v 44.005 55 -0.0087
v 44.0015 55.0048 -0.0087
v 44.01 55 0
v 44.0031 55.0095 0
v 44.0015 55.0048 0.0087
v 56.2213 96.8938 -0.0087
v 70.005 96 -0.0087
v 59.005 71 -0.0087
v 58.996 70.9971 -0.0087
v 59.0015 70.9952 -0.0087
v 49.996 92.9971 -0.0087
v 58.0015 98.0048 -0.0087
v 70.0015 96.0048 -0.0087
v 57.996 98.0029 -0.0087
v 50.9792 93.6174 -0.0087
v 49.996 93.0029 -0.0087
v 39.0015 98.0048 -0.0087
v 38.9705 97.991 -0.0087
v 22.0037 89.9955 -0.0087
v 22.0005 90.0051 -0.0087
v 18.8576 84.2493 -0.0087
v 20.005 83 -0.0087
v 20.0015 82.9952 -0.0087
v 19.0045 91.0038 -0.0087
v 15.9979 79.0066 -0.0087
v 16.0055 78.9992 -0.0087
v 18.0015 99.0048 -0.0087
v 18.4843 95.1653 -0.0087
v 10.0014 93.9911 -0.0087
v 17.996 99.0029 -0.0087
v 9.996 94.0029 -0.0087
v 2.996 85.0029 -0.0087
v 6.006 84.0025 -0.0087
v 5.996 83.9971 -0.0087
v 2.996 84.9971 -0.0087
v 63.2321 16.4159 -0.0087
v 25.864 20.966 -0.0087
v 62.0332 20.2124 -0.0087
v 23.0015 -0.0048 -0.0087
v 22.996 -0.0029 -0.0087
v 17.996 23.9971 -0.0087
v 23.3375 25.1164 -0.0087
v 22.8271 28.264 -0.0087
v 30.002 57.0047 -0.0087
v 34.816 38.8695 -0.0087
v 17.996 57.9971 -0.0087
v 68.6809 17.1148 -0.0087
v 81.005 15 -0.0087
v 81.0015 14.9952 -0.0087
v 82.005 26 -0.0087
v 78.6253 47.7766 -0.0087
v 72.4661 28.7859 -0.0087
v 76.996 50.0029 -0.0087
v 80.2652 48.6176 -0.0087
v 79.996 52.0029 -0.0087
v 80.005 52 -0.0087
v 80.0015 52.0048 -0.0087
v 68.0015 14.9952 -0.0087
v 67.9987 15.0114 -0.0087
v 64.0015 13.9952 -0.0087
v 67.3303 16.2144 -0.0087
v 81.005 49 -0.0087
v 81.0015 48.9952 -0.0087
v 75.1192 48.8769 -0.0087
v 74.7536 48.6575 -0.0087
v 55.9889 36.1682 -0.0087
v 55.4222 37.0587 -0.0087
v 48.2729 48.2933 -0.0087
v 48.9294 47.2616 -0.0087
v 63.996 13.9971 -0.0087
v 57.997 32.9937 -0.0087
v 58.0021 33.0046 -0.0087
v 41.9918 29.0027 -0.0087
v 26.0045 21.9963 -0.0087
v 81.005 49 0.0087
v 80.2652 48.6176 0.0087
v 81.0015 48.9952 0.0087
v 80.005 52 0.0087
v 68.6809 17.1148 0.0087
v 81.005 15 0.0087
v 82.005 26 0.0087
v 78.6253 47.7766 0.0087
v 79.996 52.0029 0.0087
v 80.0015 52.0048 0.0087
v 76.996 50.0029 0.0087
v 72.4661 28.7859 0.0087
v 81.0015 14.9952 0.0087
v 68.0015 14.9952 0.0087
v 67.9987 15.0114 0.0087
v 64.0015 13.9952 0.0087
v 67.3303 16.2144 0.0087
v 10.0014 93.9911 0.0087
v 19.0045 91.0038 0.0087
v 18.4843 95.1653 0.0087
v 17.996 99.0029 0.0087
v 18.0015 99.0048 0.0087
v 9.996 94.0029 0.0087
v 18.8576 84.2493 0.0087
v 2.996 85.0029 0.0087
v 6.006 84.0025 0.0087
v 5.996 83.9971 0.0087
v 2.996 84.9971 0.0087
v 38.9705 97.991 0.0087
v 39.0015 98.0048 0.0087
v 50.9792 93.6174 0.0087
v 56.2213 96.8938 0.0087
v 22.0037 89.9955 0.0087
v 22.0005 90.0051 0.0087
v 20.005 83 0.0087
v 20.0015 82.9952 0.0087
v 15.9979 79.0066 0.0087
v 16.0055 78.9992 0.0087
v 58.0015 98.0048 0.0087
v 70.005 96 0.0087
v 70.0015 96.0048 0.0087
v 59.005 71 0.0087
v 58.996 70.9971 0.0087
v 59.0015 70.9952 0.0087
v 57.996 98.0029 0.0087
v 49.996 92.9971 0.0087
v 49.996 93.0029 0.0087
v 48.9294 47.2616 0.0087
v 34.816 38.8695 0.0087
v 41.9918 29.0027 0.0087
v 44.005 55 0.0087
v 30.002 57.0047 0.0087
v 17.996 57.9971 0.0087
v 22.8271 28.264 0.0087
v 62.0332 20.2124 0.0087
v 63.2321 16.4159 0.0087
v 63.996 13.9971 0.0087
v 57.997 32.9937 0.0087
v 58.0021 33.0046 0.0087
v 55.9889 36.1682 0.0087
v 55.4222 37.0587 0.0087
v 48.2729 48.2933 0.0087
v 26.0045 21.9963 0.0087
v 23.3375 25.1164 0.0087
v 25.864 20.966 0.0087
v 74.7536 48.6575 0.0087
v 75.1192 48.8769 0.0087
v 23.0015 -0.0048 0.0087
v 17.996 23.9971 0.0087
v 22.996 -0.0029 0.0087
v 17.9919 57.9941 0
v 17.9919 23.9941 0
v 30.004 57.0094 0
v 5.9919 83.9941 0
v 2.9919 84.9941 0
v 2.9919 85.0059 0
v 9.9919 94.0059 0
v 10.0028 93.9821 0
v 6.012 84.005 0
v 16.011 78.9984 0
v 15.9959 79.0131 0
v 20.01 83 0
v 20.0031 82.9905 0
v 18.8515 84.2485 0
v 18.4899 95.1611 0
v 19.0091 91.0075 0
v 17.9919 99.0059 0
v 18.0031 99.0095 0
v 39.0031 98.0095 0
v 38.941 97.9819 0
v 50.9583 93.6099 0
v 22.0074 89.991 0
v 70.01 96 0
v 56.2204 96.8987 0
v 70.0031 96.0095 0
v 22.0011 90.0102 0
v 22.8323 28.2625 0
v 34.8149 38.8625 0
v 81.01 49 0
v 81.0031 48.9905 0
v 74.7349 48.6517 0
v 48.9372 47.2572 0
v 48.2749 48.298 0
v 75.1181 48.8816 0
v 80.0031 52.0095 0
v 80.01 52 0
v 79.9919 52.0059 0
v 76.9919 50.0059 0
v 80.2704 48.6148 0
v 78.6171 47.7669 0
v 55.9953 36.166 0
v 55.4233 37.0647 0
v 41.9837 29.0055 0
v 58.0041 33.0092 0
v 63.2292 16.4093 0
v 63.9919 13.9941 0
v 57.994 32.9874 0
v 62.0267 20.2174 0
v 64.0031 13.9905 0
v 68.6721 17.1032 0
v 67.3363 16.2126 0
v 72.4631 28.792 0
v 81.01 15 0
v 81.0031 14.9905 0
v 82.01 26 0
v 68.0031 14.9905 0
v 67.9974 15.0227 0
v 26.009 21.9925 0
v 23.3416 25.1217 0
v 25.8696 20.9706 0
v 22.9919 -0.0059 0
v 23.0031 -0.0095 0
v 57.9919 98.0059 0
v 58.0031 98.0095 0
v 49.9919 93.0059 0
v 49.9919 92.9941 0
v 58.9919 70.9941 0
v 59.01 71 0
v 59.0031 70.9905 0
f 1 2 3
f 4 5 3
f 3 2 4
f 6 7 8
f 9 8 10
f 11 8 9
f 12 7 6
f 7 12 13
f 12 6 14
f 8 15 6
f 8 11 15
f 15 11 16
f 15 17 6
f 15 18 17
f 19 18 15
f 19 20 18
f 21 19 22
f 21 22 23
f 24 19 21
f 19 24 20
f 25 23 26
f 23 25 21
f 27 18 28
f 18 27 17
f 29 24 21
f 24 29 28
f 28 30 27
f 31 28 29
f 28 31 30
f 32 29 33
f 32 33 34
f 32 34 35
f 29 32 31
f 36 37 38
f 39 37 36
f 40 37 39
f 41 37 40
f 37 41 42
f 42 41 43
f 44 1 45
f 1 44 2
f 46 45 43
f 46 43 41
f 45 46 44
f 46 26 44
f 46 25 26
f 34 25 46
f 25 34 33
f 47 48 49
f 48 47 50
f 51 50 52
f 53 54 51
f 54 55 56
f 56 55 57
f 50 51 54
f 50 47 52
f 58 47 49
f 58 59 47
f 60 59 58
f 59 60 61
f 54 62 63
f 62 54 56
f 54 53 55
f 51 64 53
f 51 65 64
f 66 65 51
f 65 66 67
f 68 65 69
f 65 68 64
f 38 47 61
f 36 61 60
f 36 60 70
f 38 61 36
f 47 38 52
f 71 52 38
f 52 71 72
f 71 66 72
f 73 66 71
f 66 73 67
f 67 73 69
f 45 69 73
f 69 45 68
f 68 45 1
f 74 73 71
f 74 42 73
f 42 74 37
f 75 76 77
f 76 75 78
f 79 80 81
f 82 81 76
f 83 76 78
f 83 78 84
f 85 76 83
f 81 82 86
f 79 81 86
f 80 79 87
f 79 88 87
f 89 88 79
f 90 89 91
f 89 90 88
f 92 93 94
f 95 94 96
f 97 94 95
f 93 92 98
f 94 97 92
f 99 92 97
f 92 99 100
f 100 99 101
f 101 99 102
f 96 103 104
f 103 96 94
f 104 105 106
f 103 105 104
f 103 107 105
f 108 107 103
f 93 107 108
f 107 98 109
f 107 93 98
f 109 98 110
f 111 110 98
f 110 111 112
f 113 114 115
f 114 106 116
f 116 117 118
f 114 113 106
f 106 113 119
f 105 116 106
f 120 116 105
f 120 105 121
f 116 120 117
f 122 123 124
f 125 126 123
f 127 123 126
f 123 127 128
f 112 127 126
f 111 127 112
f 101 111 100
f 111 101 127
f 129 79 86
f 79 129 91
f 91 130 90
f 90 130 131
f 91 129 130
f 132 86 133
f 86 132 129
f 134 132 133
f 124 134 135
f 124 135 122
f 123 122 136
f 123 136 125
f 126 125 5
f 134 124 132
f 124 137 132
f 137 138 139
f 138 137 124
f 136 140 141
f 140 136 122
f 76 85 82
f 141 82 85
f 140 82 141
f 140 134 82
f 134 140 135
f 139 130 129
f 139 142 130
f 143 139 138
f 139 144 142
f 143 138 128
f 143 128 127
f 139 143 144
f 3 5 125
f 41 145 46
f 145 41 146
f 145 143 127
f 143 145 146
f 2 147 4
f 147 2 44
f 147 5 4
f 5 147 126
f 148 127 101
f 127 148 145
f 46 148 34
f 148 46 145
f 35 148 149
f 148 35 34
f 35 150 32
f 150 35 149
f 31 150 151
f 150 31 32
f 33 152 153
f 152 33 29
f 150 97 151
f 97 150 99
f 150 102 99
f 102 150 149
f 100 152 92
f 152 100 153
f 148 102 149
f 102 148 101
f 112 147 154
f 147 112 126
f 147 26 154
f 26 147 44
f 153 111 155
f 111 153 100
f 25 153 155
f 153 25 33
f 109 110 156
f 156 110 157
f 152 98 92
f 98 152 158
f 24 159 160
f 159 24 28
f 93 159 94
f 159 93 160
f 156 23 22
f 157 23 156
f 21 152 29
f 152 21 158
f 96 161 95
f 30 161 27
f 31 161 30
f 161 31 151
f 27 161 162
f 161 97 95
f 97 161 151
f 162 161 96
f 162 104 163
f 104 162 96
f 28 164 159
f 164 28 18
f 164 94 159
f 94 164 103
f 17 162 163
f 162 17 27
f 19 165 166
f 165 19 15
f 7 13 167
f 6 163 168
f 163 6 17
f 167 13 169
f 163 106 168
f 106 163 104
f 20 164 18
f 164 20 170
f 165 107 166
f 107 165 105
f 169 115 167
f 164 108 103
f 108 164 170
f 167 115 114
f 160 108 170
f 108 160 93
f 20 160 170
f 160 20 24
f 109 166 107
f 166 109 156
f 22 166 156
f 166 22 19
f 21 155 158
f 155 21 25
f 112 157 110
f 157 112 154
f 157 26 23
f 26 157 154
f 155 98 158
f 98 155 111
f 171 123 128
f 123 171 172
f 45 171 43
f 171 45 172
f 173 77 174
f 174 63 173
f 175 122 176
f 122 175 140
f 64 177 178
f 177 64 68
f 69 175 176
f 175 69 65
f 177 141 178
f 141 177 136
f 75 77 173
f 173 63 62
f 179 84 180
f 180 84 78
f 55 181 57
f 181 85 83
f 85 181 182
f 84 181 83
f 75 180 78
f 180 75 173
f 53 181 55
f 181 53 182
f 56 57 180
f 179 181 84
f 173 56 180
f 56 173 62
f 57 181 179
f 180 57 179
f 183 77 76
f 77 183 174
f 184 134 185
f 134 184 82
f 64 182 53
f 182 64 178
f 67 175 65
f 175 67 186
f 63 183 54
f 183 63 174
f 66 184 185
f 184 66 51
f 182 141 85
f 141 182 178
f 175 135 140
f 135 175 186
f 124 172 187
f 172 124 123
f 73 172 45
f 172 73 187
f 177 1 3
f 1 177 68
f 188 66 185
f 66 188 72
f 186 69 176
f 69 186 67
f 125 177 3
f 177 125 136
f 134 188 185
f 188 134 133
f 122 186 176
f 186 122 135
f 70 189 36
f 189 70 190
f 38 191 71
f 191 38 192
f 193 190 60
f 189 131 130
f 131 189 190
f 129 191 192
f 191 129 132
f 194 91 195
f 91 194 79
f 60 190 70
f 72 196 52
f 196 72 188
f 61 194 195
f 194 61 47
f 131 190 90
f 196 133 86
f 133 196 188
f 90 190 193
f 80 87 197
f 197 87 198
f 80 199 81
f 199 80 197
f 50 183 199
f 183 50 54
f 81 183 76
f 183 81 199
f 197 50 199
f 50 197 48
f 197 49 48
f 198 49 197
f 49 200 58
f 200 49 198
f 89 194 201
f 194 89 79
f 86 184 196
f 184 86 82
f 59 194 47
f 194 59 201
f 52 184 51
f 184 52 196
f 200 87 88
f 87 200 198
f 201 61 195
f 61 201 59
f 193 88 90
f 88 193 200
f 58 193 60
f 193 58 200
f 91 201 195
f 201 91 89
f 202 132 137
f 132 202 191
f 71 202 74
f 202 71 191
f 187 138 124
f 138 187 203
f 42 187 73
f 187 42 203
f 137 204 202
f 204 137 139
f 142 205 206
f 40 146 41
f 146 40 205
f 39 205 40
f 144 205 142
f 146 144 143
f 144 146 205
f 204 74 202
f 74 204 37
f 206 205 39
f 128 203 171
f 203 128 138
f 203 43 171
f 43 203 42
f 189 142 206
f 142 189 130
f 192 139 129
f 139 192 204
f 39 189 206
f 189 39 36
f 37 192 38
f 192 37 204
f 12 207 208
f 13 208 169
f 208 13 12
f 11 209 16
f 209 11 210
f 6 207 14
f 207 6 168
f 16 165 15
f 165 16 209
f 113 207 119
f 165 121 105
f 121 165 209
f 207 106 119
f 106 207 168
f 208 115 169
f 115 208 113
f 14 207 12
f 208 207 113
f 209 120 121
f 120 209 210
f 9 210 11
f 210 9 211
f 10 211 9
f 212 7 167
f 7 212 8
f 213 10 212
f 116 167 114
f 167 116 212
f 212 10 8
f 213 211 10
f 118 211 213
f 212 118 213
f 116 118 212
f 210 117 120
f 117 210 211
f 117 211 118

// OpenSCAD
color([0.3194819673674283,0.6655357355223767,0.22692357675811492]) hull(){
    translate([18,58]) sphere(0.01);
    translate([18,24]) sphere(0.01);
    translate([44,55]) sphere(0.01);
}
color([0.9464906820257937,0.35776616524050997,0.9421064453260054]) hull(){
    translate([18,58]) sphere(0.01);
    translate([44,55]) sphere(0.01);
    translate([30,57]) sphere(0.01);
}
color([0.3792404853118415,0.27508202782836655,0.9368074710650367]) hull(){
    translate([18,58]) sphere(0.01);
    translate([30,57]) sphere(0.01);
    translate([6,84]) sphere(0.01);
}
color([0.7670397757471089,0.17483880300164423,0.7474114244696689]) hull(){
    translate([6,84]) sphere(0.01);
    translate([3,85]) sphere(0.01);
    translate([10,94]) sphere(0.01);
}
color([0.6015236368594579,0.5872808850844162,0.28390336255679416]) hull(){
    translate([6,84]) sphere(0.01);
    translate([30,57]) sphere(0.01);
    translate([16,79]) sphere(0.01);
}
color([0.5839405385485582,0.4048698908705002,0.6877557316706271]) hull(){
    translate([10,94]) sphere(0.01);
    translate([20,83]) sphere(0.01);
    translate([18,99]) sphere(0.01);
}
color([0.29310936231965135,0.08456113000314536,0.6409271470126323]) hull(){
    translate([10,94]) sphere(0.01);
    translate([18,99]) sphere(0.01);
    translate([39,98]) sphere(0.01);
}
color([0.38512246522478266,0.6162859510128613,0.407224705538046]) hull(){
    translate([39,98]) sphere(0.01);
    translate([22,90]) sphere(0.01);
    translate([70,96]) sphere(0.01);
}
color([0.6107800780239486,0.9541913078580654,0.09369719926319908]) hull(){
    translate([22,90]) sphere(0.01);
    translate([20,83]) sphere(0.01);
    translate([10,94]) sphere(0.01);
}
color([0.4396226851829427,0.9817497074141792,0.30111933510979894]) hull(){
    translate([20,83]) sphere(0.01);
    translate([22,90]) sphere(0.01);
    translate([16,79]) sphere(0.01);
}
color([0.08571041628526821,0.691130580335744,0.16573157374072334]) hull(){
    translate([16,79]) sphere(0.01);
    translate([30,57]) sphere(0.01);
    translate([35,48]) sphere(0.01);
}
color([0.4668304924867862,0.30100213617539295,0.3511677492745029]) hull(){
    translate([30,57]) sphere(0.01);
    translate([26,51]) sphere(0.01);
    translate([35,48]) sphere(0.01);
}
color([0.05564944269037686,0.7696481469448815,0.686275624239137]) hull(){
    translate([35,48]) sphere(0.01);
    translate([26,51]) sphere(0.01);
    translate([44,47]) sphere(0.01);
}
color([0.15447252119296884,0.35335085758162643,0.18799175914388588]) hull(){
    translate([26,51]) sphere(0.01);
    translate([44,55]) sphere(0.01);
    translate([44,47]) sphere(0.01);
}
color([0.41322879780265653,0.82270842281296,0.9057146612667819]) hull(){
    translate([44,55]) sphere(0.01);
    translate([18,24]) sphere(0.01);
    translate([44,47]) sphere(0.01);
}
color([0.9688547633127277,0.5528378273263655,0.12760284187612392]) hull(){
    translate([44,47]) sphere(0.01);
    translate([35,48]) sphere(0.01);
    translate([81,49]) sphere(0.01);
}
color([0.1710979555253146,0.7131998843266452,0.6397779425125977]) hull(){
    translate([81,49]) sphere(0.01);
    translate([77,50]) sphere(0.01);
    translate([80,52]) sphere(0.01);
}
color([0.57496968906483,0.8489371230716904,0.07944838941339594]) hull(){
    translate([77,50]) sphere(0.01);
    translate([42,29]) sphere(0.01);
    translate([81,49]) sphere(0.01);
}
color([0.040333123224873146,0.9305910632054132,0.3080440975445232]) hull(){
    translate([42,29]) sphere(0.01);
    translate([44,55]) sphere(0.01);
    translate([26,51]) sphere(0.01);
}
color([0.6084655882345898,0.4923441190446234,0.7069385087242315]) hull(){
    translate([44,55]) sphere(0.01);
    translate([42,29]) sphere(0.01);
    translate([58,33]) sphere(0.01);
}
color([0.6803385961846494,0.18024793645131376,0.10787678186317007]) hull(){
    translate([58,33]) sphere(0.01);
    translate([64,14]) sphere(0.01);
    translate([82,26]) sphere(0.01);
}
color([0.1335624130282893,0.47731112778056706,0.8393950916733898]) hull(){
    translate([82,26]) sphere(0.01);
    translate([80,52]) sphere(0.01);
    translate([81,15]) sphere(0.01);
}
color([0.6780893207968227,0.08337096158279222,0.27725115680544954]) hull(){
    translate([80,52]) sphere(0.01);
    translate([68,15]) sphere(0.01);
    translate([81,15]) sphere(0.01);
}
color([0.9965791662073833,0.03375154870506614,0.10494976972159242]) hull(){
    translate([68,15]) sphere(0.01);
    translate([64,14]) sphere(0.01);
    translate([58,33]) sphere(0.01);
}
color([0.516844917539197,0.1360610465034362,0.543805910213663]) hull(){
    translate([58,33]) sphere(0.01);
    translate([42,29]) sphere(0.01);
    translate([26,22]) sphere(0.01);
}
color([0.04901628196141694,0.4867102513994055,0.8813892002857401]) hull(){
    translate([42,29]) sphere(0.01);
    translate([26,22]) sphere(0.01);
    translate([18,24]) sphere(0.01);
}
color([0.3053751014353143,0.40772022041766365,0.31297204198076634]) hull(){
    translate([26,22]) sphere(0.01);
    translate([23,0]) sphere(0.01);
    translate([18,24]) sphere(0.01);
}
color([0.49907796034366436,0.6160709555012981,0.9916538905911245]) hull(){
    translate([18,24]) sphere(0.01);
    translate([18,58]) sphere(0.01);
    translate([24,21]) sphere(0.01);
}
color([0.3123575451593331,0.46364206475662195,0.8862899719975306]) hull(){
    translate([24,21]) sphere(0.01);
    translate([23,0]) sphere(0.01);
    translate([26,22]) sphere(0.01);
}
color([0.5738800220993816,0.8494037217359881,0.24323676398212035]) hull(){
    translate([23,0]) sphere(0.01);
    translate([72,20]) sphere(0.01);
    translate([24,21]) sphere(0.01);
}
color([0.8402878098664139,0.9530478541805099,0.16594803365564914]) hull(){
    translate([72,20]) sphere(0.01);
    translate([82,26]) sphere(0.01);
    translate([64,14]) sphere(0.01);
}
color([0.0023370868964924796,0.7387895340607371,0.5374530602666081]) hull(){
    translate([58,98]) sphere(0.01);
    translate([50,93]) sphere(0.01);
    translate([70,96]) sphere(0.01);
}
color([0.25604025835089217,0.4320068924153808,0.5112453323210508]) hull(){
    translate([50,93]) sphere(0.01);
    translate([59,71]) sphere(0.01);
    translate([70,96]) sphere(0.01);
}
